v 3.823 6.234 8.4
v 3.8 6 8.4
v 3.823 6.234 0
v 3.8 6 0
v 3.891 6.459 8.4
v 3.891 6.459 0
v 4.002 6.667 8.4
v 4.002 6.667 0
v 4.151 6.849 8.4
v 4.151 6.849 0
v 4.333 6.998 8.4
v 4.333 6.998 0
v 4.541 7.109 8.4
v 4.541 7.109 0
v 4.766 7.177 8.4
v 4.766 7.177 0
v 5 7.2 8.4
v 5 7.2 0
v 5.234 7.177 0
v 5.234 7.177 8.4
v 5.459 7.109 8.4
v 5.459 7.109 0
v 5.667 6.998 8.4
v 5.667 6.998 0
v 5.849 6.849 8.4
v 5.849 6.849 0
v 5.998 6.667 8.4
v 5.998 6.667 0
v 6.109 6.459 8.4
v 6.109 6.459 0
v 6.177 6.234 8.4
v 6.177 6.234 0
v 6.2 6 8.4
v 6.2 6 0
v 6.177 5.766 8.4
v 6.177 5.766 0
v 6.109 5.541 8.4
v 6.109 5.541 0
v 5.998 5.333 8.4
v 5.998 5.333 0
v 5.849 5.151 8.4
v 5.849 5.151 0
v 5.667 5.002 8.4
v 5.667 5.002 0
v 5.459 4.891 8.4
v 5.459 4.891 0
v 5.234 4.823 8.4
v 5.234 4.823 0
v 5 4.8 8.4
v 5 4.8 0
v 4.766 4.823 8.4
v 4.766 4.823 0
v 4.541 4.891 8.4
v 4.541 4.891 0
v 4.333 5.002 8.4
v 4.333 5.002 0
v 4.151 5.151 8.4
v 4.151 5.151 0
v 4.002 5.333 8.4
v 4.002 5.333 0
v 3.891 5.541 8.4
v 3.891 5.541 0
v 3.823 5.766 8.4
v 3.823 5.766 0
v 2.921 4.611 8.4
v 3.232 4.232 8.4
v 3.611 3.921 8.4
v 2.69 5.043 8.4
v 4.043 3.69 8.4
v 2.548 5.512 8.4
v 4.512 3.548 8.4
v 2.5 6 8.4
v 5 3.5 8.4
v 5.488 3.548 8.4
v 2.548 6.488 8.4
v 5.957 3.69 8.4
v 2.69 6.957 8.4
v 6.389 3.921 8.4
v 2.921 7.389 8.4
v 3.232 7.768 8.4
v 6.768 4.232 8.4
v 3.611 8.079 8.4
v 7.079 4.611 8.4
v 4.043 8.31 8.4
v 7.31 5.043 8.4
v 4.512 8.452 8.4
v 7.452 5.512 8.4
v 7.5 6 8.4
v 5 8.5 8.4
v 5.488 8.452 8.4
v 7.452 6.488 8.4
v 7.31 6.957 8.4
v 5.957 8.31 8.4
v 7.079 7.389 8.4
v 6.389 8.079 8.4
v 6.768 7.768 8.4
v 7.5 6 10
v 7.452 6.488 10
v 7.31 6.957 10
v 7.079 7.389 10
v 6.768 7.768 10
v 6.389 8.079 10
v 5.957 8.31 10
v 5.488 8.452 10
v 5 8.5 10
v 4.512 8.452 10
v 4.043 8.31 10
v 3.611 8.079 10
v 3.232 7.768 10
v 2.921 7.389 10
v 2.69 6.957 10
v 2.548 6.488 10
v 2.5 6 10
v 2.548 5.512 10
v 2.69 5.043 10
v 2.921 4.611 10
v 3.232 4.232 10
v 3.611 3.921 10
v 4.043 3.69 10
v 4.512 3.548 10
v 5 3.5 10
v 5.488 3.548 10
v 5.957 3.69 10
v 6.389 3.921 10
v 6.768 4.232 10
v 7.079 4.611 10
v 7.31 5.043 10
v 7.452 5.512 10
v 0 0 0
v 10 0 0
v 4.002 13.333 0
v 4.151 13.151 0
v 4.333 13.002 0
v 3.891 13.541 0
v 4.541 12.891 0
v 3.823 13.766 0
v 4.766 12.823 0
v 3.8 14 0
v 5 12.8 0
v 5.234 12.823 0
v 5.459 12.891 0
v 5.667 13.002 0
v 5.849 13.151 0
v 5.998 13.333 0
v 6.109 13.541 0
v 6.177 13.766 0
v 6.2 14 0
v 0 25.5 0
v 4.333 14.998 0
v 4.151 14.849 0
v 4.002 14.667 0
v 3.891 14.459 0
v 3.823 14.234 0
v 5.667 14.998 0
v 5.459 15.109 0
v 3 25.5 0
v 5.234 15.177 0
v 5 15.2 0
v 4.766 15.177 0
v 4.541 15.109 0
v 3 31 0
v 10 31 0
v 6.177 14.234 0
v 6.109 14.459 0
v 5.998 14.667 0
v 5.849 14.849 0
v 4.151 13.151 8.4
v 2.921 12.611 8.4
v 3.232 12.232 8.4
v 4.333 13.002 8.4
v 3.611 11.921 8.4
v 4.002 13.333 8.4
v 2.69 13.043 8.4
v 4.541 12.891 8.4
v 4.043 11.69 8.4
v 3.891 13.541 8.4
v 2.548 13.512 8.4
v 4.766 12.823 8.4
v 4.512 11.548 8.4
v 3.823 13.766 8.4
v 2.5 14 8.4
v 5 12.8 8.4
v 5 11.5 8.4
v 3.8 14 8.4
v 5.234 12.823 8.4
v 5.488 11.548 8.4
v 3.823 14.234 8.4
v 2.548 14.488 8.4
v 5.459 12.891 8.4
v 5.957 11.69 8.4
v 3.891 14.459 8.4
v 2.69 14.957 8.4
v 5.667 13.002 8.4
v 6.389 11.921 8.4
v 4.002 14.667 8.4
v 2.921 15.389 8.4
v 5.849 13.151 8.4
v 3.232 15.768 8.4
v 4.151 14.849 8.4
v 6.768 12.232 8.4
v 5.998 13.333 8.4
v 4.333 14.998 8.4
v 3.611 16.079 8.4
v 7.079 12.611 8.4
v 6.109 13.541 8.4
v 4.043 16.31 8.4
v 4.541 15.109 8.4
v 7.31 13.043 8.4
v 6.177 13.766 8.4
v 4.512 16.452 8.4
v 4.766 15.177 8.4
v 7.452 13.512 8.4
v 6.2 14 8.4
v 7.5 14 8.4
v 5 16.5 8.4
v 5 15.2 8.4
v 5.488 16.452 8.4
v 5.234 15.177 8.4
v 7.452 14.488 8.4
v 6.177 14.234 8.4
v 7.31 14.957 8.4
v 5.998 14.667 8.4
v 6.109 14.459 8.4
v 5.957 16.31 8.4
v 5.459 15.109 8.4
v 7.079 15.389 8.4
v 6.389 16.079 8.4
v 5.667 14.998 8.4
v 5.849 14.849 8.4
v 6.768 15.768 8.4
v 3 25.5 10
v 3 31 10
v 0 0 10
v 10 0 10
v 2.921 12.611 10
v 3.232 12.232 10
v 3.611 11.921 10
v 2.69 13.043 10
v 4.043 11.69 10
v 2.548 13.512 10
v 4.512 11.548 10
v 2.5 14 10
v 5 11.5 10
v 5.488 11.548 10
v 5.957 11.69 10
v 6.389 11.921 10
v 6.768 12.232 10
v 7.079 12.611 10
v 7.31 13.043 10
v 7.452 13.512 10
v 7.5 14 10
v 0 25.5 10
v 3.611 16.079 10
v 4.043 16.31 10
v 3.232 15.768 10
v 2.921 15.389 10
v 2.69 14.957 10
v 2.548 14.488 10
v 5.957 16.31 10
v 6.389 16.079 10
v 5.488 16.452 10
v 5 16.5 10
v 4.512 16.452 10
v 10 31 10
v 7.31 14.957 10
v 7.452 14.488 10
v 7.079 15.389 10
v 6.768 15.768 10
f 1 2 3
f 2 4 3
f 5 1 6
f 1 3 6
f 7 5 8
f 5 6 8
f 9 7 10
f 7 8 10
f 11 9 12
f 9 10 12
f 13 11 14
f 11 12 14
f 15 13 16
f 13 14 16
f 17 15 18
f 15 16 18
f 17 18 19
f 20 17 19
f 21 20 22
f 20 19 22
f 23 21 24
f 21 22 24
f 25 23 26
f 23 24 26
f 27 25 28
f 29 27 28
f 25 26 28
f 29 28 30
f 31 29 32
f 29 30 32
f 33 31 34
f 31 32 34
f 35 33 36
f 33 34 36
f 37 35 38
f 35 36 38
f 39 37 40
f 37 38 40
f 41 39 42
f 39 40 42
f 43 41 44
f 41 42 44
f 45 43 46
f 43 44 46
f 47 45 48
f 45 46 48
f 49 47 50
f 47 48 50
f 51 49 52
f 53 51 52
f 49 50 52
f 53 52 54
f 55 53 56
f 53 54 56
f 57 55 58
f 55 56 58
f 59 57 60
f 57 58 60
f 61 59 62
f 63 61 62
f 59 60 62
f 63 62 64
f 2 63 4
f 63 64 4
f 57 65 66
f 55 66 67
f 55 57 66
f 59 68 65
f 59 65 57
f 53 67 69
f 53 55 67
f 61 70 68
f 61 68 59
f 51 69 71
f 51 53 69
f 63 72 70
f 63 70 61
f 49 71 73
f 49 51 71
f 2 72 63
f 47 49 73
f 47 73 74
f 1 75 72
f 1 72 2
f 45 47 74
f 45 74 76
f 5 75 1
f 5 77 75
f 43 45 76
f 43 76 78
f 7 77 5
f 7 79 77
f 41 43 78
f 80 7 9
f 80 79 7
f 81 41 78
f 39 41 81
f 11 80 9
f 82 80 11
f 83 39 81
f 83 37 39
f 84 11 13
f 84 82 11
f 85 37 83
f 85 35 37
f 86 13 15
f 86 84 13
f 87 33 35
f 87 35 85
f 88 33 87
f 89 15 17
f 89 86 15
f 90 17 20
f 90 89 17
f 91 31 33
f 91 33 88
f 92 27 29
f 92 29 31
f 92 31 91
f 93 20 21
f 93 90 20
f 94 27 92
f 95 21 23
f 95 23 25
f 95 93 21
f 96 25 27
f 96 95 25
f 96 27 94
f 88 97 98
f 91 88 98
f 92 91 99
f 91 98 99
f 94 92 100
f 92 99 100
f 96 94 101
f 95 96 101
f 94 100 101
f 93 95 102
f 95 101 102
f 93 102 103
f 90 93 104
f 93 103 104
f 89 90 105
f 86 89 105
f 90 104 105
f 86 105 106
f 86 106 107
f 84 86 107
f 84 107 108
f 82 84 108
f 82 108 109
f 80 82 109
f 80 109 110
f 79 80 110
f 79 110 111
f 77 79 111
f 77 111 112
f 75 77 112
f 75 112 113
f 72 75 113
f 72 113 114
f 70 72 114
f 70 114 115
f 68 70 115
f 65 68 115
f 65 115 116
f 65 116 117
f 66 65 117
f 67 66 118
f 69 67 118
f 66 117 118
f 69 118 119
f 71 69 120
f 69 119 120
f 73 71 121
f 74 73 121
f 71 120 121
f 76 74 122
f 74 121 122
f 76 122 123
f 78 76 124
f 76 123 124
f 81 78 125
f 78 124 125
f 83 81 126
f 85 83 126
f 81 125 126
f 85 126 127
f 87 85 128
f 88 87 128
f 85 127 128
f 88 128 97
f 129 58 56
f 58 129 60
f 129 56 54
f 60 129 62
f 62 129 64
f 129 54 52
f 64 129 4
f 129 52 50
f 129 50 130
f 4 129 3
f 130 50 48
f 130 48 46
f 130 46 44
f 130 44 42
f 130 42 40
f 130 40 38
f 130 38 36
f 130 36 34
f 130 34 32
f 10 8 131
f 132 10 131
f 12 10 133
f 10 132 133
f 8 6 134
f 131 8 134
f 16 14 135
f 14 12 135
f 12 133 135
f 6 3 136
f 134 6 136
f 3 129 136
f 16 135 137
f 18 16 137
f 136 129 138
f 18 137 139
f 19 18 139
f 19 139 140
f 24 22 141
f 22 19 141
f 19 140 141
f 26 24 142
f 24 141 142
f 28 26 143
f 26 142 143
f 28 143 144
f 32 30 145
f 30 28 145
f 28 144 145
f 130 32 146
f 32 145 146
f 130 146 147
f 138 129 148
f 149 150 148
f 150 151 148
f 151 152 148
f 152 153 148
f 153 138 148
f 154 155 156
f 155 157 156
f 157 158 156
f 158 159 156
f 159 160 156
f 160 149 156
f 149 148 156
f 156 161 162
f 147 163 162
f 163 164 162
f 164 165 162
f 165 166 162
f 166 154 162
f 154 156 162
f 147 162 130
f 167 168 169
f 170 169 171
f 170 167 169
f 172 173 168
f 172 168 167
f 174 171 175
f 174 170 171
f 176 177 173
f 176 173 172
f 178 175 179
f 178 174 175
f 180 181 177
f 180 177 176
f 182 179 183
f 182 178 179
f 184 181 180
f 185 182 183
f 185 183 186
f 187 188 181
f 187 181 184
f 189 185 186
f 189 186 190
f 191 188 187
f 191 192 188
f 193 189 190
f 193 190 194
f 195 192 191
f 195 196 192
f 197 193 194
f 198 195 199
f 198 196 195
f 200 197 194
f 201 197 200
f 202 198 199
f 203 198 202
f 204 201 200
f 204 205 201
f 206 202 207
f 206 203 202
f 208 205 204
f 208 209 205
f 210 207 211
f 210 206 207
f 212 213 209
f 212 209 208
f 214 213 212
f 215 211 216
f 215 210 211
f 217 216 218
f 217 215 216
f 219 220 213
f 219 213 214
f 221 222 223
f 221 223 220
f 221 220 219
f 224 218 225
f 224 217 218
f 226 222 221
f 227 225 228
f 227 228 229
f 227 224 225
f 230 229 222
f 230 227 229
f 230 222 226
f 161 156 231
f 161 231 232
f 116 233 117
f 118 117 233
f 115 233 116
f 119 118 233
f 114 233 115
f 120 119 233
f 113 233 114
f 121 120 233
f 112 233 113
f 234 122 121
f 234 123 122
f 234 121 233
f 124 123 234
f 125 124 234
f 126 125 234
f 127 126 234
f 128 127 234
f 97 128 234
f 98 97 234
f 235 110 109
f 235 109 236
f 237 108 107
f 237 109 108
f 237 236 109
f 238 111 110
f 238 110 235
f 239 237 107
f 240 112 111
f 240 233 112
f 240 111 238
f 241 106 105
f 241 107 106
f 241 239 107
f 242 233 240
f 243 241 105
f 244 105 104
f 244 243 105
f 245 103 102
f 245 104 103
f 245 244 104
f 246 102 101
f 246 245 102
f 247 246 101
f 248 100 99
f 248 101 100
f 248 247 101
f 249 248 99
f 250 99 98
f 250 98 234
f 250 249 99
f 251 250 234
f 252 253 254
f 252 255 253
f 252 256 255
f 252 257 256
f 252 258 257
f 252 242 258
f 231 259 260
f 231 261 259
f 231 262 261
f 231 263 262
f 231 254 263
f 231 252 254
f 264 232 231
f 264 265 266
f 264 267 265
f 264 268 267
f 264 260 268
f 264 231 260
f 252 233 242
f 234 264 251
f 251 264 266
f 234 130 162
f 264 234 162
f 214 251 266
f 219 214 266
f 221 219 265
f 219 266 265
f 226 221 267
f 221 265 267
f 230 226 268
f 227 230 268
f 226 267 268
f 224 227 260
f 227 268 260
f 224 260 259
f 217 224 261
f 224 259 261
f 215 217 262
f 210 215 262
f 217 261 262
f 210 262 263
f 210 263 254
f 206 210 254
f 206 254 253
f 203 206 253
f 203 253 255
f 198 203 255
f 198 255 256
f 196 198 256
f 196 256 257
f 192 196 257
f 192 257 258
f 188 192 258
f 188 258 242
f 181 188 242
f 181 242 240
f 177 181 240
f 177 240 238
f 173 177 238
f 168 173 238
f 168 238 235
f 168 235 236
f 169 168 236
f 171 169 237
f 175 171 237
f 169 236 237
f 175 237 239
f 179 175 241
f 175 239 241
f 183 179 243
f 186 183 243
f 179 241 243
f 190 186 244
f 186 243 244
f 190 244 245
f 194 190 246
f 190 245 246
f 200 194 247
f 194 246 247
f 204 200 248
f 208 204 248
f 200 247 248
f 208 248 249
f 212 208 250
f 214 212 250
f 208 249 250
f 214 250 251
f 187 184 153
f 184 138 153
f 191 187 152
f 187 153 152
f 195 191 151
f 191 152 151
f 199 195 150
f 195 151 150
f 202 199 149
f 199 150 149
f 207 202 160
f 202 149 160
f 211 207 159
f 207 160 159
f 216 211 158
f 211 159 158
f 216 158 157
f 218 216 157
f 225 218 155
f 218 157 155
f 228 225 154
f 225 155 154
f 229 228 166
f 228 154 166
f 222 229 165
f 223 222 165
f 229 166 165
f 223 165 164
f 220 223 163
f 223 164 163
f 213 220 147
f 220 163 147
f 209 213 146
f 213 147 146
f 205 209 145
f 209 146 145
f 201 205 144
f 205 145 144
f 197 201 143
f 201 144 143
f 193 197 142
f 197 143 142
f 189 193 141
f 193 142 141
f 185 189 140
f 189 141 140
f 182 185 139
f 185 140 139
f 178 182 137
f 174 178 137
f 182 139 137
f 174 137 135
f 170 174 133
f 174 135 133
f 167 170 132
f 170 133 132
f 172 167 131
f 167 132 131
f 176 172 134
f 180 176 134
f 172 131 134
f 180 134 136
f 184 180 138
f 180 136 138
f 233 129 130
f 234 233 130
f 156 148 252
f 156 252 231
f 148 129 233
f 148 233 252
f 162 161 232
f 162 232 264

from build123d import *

# Parameters (mm, degrees)
SKETCH1_W                                = 10
SKETCH1_H                                = 31
BOSS_EXTRUDE1_DEPTH                      = 10
SKETCH2_W                                = 3
SKETCH2_H                                = 5.5
CUT_EXTRUDE1_DEPTH                       = 10
CBORE_FOR_M2_PAN_HEAD_SCREW1_D           = 2.4
CBORE_FOR_M2_PAN_HEAD_SCREW1_DEPTH       = 10
CBORE_FOR_M2_PAN_HEAD_SCREW1_CBORE_D     = 5
CBORE_FOR_M2_PAN_HEAD_SCREW1_CBORE_DEPTH = 1.6
CBORE_FOR_M2_PAN_HEAD_SCREW1_TIP         = 0.721032743


with BuildPart() as part:
    # Sketch1 → Boss-Extrude1 (new body)
    with BuildSketch(Plane.XY):
        with Locations((5, 15.5)):
            Rectangle(SKETCH1_W, SKETCH1_H)
    extrude(amount=BOSS_EXTRUDE1_DEPTH)

    # Sketch2 → Cut-Extrude1 (cut)
    with BuildSketch(Plane.XY.offset(10)):
        with Locations((1.5, 28.25)):
            Rectangle(SKETCH2_W, SKETCH2_H)
    extrude(amount=-CUT_EXTRUDE1_DEPTH, mode=Mode.SUBTRACT)

    # CBORE for M2 Pan Head Screw1
    with Locations(Plane.XY.offset(10)):
        with Locations((5, 14), (5, 6)):
            CounterBoreHole(CBORE_FOR_M2_PAN_HEAD_SCREW1_D / 2, CBORE_FOR_M2_PAN_HEAD_SCREW1_CBORE_D / 2, CBORE_FOR_M2_PAN_HEAD_SCREW1_CBORE_DEPTH, depth=CBORE_FOR_M2_PAN_HEAD_SCREW1_DEPTH)
            with Locations((0, 0, -(CBORE_FOR_M2_PAN_HEAD_SCREW1_DEPTH + CBORE_FOR_M2_PAN_HEAD_SCREW1_TIP / 2))):  # 118° drill point
                Cone(0, CBORE_FOR_M2_PAN_HEAD_SCREW1_D / 2, CBORE_FOR_M2_PAN_HEAD_SCREW1_TIP, mode=Mode.SUBTRACT)


solid = part.part
